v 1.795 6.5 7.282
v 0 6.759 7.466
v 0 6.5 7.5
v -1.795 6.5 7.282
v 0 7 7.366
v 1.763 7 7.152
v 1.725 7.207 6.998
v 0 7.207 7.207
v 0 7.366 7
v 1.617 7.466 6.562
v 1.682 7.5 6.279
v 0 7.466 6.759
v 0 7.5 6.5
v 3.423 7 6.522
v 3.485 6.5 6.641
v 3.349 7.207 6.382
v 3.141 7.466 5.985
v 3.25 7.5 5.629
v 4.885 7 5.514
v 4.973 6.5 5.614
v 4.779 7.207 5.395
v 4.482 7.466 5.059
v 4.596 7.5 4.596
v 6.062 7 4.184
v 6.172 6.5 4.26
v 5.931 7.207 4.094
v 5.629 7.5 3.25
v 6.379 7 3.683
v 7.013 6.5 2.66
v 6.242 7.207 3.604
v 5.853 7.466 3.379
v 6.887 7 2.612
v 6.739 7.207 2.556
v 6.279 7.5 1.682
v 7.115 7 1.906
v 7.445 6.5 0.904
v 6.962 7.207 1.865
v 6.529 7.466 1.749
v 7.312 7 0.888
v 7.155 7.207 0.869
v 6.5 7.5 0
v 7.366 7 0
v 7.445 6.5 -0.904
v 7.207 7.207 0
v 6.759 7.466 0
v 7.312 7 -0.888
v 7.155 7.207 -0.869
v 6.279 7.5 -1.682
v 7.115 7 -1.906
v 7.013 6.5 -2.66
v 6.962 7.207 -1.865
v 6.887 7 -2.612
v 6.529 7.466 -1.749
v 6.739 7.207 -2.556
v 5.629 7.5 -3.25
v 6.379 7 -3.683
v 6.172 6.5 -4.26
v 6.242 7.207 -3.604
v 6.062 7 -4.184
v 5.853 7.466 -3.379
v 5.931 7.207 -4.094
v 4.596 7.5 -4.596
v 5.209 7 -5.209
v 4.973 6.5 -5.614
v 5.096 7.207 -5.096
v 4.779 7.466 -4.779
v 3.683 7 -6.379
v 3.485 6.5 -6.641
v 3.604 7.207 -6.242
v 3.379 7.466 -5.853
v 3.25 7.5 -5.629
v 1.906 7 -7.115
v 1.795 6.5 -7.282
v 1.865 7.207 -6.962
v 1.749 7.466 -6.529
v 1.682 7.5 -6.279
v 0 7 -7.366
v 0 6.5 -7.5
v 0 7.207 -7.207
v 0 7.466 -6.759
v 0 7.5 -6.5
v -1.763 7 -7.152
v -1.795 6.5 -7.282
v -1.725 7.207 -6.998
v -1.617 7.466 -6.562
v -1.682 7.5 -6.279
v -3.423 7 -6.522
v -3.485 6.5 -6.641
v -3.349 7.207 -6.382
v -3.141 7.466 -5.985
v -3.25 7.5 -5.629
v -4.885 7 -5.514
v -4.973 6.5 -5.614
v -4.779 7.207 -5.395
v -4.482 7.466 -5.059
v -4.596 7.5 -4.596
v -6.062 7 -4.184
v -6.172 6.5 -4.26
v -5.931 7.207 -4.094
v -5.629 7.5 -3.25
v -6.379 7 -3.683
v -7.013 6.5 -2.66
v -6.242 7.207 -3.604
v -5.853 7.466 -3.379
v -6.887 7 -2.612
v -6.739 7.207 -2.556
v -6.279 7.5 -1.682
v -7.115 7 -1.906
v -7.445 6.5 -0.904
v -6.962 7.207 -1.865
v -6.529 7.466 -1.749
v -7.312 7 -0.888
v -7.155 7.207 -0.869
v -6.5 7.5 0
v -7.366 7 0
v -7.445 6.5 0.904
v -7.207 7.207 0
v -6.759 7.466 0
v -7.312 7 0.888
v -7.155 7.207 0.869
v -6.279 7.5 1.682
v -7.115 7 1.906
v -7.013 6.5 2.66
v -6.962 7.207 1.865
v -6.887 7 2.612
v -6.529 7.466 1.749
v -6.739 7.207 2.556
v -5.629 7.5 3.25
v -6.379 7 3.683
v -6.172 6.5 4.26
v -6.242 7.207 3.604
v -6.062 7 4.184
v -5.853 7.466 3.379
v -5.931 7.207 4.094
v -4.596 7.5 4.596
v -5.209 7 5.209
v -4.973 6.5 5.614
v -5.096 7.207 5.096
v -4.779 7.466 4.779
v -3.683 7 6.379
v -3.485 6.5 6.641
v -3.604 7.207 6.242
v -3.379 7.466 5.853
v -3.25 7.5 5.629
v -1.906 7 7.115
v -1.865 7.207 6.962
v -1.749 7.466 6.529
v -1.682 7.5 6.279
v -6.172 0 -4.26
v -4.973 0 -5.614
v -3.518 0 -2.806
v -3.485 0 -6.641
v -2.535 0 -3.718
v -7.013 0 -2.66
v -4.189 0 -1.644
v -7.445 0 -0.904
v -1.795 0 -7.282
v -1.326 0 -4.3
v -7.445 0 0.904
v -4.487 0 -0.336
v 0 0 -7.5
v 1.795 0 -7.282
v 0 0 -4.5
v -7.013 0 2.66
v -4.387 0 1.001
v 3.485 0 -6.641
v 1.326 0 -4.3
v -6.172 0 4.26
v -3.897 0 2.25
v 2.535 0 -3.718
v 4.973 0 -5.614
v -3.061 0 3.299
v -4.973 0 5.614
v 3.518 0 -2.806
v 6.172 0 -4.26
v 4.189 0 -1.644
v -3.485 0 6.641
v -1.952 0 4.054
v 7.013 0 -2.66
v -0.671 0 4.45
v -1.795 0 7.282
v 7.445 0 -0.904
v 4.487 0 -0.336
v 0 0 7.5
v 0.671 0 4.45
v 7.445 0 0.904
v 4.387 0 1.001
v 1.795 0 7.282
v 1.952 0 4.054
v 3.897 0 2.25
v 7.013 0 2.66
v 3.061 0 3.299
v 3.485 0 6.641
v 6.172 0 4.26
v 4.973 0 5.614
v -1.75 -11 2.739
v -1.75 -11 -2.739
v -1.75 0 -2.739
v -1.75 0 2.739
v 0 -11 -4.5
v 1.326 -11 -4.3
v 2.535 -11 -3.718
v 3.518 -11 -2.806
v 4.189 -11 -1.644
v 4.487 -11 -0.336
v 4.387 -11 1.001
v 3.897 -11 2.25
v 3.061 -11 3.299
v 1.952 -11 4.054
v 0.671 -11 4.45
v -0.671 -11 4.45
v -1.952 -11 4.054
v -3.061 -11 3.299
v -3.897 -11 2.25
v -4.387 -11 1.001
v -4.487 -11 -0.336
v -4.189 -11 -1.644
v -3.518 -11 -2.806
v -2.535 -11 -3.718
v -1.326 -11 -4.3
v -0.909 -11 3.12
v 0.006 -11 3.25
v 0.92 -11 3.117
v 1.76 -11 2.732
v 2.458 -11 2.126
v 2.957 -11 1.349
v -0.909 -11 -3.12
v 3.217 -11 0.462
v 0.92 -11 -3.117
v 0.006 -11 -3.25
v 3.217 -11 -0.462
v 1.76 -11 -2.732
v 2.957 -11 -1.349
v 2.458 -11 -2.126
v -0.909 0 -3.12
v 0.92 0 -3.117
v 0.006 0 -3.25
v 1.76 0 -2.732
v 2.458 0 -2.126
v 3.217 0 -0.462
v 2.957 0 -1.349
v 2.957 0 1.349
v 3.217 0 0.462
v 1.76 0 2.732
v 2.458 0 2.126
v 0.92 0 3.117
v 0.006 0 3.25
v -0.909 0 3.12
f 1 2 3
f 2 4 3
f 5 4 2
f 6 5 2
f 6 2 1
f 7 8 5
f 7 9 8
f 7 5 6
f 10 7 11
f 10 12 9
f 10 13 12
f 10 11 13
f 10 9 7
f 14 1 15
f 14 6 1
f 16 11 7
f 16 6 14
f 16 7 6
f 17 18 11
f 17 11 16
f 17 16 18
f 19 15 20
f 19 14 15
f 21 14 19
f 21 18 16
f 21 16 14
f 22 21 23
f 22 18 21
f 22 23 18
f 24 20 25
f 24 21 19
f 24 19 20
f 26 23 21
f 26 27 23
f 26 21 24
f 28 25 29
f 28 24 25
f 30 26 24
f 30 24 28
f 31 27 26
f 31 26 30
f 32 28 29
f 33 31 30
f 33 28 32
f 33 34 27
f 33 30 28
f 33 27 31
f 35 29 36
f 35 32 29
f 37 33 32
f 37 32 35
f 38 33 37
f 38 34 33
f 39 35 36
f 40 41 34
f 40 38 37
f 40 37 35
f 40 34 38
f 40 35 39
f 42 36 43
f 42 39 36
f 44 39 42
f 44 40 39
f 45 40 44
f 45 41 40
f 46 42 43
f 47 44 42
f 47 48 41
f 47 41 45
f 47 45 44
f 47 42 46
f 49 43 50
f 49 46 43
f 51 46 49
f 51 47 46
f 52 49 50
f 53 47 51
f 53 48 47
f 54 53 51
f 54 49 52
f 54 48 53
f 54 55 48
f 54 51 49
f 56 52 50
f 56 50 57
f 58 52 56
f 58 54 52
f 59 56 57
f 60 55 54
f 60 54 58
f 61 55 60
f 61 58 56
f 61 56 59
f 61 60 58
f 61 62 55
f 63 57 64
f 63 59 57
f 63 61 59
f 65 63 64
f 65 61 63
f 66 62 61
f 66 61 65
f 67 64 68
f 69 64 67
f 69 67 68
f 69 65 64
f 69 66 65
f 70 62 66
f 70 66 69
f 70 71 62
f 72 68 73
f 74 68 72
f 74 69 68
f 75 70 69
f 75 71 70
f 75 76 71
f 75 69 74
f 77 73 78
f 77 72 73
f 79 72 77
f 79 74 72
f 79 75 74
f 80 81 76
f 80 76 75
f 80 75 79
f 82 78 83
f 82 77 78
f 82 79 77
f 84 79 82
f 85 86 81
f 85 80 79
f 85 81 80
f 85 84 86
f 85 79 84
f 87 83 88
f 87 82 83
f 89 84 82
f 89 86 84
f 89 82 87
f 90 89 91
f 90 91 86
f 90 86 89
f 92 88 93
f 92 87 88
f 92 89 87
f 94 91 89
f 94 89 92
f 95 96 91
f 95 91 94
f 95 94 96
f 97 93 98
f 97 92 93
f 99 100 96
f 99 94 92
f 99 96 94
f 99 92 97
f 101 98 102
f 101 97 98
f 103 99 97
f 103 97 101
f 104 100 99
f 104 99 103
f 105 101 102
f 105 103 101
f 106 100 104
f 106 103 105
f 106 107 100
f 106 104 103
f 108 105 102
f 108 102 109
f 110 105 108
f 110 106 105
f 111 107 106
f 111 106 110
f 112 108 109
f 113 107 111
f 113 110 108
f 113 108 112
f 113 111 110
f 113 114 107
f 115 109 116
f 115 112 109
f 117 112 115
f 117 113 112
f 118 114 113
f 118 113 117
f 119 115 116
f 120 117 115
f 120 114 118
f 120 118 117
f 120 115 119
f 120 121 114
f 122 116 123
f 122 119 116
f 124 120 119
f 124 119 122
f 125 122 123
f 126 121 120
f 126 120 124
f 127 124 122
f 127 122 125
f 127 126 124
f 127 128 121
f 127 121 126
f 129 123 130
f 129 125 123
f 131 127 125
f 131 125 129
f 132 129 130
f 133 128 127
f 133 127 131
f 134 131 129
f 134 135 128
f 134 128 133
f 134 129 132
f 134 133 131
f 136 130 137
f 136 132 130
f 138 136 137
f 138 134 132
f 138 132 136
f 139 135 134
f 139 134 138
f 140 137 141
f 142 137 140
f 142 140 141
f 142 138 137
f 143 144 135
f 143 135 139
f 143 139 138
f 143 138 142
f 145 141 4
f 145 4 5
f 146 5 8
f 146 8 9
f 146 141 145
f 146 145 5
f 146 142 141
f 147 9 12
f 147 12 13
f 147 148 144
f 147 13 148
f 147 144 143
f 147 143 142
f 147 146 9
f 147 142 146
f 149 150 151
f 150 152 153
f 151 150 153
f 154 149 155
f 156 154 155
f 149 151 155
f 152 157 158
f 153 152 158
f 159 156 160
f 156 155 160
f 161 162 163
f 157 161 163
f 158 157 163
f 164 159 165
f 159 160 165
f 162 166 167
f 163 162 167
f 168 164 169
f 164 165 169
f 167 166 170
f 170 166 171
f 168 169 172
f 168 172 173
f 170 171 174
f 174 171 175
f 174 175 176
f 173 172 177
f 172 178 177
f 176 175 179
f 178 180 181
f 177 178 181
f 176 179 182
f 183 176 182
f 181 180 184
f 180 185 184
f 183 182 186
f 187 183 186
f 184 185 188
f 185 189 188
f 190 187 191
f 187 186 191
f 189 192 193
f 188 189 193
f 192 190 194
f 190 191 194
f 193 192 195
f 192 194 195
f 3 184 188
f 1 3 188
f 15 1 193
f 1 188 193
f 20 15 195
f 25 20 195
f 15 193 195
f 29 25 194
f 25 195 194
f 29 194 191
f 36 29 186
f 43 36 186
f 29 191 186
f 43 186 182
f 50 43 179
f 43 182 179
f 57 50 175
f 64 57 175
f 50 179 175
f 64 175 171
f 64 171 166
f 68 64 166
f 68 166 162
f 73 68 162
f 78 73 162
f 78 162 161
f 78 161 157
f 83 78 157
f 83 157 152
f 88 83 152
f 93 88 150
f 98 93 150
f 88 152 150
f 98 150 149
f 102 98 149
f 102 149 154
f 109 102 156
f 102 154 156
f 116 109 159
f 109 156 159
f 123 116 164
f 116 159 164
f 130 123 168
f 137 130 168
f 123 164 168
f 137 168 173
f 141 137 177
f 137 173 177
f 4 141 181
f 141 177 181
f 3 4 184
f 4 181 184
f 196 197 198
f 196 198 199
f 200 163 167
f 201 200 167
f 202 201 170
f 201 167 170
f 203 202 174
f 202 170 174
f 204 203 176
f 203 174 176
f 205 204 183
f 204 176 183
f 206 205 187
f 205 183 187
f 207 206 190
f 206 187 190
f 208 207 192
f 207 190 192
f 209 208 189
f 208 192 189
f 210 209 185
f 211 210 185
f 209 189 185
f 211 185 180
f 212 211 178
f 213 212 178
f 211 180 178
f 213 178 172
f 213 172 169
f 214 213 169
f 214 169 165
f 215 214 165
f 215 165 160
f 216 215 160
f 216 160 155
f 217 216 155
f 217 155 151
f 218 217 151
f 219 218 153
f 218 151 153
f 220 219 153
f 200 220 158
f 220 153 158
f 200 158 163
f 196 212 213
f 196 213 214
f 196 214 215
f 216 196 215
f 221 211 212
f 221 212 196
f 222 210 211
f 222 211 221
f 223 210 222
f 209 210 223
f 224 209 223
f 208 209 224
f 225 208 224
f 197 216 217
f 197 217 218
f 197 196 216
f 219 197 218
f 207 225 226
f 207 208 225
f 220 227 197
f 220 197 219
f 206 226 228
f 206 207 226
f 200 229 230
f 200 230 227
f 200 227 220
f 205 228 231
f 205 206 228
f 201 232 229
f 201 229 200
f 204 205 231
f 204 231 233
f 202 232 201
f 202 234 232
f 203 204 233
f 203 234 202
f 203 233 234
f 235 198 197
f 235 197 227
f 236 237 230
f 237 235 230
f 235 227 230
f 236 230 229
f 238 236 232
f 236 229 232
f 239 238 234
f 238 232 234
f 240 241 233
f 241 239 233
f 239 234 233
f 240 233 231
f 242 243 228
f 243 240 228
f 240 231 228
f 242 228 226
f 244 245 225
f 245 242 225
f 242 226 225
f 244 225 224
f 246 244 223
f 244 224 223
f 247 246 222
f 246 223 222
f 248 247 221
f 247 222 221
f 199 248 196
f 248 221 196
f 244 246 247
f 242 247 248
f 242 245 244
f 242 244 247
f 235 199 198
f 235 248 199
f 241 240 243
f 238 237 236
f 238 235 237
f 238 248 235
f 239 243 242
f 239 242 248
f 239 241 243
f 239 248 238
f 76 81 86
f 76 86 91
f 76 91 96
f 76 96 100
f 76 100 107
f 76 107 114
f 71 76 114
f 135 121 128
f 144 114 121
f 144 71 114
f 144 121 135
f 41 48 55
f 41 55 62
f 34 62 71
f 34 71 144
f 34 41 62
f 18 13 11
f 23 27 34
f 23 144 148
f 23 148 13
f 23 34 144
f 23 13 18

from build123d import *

# Parameters (mm, degrees)
SKETCH1_R           = 7.5
BOSS_EXTRUDE1_DEPTH = 7.5
FILLET1_R           = 1
SKETCH2_R           = 4.5
BOSS_EXTRUDE2_DEPTH = 11
SKETCH3_R           = 3.25
CUT_EXTRUDE1_DEPTH  = 11
BOSS_EXTRUDE3_START = 11
BOSS_EXTRUDE3_DEPTH = 11


with BuildPart() as part:
    # Sketch1 → Boss-Extrude1 (new body)
    with BuildSketch(Plane(origin=(0, 0, 0), x_dir=(1, 0, 0), z_dir=(0, 1, 0))):
        with Locations(Location((0, 0, 0), (0, 0, 270))):
            Circle(SKETCH1_R)
    extrude(amount=BOSS_EXTRUDE1_DEPTH)

    # Fillet1
    fillet1_edges = [part.edges().sort_by_distance(p)[0] for p in [
        (0, 7.5, -7.5),
    ]]
    fillet(fillet1_edges, radius=FILLET1_R)

    # Sketch2 → Boss-Extrude2 (add)
    with BuildSketch(Plane.XZ):
        with Locations(Location((0, 0, 0), (0, 0, 270))):
            Circle(SKETCH2_R)
    extrude(amount=BOSS_EXTRUDE2_DEPTH)

    # Sketch3 → Cut-Extrude1 (cut)
    with BuildSketch(Plane(origin=(0, -11, 0), x_dir=(-1, 0, 0), z_dir=(0, -1, 0))):
        with Locations(Location((0, 0, 0), (0, 0, 90))):
            Circle(SKETCH3_R)
    extrude(amount=-CUT_EXTRUDE1_DEPTH, mode=Mode.SUBTRACT)

    # Sketch4 → Boss-Extrude3 (add)
    with BuildSketch(Plane(origin=(0, 0, 0), x_dir=(-1, 0, 0), z_dir=(0, -1, 0)).offset(BOSS_EXTRUDE3_START)):
        with BuildLine():
            Line((1.75, 2.738612788), (1.75, -2.738612788))
            ThreePointArc((1.75, -2.738612788), (2.850438563, -1.5612495), (3.25, 0))
            ThreePointArc((3.25, 0), (2.850438563, 1.5612495), (1.75, 2.738612788))
        make_face()
    extrude(amount=-BOSS_EXTRUDE3_DEPTH)


solid = part.part
